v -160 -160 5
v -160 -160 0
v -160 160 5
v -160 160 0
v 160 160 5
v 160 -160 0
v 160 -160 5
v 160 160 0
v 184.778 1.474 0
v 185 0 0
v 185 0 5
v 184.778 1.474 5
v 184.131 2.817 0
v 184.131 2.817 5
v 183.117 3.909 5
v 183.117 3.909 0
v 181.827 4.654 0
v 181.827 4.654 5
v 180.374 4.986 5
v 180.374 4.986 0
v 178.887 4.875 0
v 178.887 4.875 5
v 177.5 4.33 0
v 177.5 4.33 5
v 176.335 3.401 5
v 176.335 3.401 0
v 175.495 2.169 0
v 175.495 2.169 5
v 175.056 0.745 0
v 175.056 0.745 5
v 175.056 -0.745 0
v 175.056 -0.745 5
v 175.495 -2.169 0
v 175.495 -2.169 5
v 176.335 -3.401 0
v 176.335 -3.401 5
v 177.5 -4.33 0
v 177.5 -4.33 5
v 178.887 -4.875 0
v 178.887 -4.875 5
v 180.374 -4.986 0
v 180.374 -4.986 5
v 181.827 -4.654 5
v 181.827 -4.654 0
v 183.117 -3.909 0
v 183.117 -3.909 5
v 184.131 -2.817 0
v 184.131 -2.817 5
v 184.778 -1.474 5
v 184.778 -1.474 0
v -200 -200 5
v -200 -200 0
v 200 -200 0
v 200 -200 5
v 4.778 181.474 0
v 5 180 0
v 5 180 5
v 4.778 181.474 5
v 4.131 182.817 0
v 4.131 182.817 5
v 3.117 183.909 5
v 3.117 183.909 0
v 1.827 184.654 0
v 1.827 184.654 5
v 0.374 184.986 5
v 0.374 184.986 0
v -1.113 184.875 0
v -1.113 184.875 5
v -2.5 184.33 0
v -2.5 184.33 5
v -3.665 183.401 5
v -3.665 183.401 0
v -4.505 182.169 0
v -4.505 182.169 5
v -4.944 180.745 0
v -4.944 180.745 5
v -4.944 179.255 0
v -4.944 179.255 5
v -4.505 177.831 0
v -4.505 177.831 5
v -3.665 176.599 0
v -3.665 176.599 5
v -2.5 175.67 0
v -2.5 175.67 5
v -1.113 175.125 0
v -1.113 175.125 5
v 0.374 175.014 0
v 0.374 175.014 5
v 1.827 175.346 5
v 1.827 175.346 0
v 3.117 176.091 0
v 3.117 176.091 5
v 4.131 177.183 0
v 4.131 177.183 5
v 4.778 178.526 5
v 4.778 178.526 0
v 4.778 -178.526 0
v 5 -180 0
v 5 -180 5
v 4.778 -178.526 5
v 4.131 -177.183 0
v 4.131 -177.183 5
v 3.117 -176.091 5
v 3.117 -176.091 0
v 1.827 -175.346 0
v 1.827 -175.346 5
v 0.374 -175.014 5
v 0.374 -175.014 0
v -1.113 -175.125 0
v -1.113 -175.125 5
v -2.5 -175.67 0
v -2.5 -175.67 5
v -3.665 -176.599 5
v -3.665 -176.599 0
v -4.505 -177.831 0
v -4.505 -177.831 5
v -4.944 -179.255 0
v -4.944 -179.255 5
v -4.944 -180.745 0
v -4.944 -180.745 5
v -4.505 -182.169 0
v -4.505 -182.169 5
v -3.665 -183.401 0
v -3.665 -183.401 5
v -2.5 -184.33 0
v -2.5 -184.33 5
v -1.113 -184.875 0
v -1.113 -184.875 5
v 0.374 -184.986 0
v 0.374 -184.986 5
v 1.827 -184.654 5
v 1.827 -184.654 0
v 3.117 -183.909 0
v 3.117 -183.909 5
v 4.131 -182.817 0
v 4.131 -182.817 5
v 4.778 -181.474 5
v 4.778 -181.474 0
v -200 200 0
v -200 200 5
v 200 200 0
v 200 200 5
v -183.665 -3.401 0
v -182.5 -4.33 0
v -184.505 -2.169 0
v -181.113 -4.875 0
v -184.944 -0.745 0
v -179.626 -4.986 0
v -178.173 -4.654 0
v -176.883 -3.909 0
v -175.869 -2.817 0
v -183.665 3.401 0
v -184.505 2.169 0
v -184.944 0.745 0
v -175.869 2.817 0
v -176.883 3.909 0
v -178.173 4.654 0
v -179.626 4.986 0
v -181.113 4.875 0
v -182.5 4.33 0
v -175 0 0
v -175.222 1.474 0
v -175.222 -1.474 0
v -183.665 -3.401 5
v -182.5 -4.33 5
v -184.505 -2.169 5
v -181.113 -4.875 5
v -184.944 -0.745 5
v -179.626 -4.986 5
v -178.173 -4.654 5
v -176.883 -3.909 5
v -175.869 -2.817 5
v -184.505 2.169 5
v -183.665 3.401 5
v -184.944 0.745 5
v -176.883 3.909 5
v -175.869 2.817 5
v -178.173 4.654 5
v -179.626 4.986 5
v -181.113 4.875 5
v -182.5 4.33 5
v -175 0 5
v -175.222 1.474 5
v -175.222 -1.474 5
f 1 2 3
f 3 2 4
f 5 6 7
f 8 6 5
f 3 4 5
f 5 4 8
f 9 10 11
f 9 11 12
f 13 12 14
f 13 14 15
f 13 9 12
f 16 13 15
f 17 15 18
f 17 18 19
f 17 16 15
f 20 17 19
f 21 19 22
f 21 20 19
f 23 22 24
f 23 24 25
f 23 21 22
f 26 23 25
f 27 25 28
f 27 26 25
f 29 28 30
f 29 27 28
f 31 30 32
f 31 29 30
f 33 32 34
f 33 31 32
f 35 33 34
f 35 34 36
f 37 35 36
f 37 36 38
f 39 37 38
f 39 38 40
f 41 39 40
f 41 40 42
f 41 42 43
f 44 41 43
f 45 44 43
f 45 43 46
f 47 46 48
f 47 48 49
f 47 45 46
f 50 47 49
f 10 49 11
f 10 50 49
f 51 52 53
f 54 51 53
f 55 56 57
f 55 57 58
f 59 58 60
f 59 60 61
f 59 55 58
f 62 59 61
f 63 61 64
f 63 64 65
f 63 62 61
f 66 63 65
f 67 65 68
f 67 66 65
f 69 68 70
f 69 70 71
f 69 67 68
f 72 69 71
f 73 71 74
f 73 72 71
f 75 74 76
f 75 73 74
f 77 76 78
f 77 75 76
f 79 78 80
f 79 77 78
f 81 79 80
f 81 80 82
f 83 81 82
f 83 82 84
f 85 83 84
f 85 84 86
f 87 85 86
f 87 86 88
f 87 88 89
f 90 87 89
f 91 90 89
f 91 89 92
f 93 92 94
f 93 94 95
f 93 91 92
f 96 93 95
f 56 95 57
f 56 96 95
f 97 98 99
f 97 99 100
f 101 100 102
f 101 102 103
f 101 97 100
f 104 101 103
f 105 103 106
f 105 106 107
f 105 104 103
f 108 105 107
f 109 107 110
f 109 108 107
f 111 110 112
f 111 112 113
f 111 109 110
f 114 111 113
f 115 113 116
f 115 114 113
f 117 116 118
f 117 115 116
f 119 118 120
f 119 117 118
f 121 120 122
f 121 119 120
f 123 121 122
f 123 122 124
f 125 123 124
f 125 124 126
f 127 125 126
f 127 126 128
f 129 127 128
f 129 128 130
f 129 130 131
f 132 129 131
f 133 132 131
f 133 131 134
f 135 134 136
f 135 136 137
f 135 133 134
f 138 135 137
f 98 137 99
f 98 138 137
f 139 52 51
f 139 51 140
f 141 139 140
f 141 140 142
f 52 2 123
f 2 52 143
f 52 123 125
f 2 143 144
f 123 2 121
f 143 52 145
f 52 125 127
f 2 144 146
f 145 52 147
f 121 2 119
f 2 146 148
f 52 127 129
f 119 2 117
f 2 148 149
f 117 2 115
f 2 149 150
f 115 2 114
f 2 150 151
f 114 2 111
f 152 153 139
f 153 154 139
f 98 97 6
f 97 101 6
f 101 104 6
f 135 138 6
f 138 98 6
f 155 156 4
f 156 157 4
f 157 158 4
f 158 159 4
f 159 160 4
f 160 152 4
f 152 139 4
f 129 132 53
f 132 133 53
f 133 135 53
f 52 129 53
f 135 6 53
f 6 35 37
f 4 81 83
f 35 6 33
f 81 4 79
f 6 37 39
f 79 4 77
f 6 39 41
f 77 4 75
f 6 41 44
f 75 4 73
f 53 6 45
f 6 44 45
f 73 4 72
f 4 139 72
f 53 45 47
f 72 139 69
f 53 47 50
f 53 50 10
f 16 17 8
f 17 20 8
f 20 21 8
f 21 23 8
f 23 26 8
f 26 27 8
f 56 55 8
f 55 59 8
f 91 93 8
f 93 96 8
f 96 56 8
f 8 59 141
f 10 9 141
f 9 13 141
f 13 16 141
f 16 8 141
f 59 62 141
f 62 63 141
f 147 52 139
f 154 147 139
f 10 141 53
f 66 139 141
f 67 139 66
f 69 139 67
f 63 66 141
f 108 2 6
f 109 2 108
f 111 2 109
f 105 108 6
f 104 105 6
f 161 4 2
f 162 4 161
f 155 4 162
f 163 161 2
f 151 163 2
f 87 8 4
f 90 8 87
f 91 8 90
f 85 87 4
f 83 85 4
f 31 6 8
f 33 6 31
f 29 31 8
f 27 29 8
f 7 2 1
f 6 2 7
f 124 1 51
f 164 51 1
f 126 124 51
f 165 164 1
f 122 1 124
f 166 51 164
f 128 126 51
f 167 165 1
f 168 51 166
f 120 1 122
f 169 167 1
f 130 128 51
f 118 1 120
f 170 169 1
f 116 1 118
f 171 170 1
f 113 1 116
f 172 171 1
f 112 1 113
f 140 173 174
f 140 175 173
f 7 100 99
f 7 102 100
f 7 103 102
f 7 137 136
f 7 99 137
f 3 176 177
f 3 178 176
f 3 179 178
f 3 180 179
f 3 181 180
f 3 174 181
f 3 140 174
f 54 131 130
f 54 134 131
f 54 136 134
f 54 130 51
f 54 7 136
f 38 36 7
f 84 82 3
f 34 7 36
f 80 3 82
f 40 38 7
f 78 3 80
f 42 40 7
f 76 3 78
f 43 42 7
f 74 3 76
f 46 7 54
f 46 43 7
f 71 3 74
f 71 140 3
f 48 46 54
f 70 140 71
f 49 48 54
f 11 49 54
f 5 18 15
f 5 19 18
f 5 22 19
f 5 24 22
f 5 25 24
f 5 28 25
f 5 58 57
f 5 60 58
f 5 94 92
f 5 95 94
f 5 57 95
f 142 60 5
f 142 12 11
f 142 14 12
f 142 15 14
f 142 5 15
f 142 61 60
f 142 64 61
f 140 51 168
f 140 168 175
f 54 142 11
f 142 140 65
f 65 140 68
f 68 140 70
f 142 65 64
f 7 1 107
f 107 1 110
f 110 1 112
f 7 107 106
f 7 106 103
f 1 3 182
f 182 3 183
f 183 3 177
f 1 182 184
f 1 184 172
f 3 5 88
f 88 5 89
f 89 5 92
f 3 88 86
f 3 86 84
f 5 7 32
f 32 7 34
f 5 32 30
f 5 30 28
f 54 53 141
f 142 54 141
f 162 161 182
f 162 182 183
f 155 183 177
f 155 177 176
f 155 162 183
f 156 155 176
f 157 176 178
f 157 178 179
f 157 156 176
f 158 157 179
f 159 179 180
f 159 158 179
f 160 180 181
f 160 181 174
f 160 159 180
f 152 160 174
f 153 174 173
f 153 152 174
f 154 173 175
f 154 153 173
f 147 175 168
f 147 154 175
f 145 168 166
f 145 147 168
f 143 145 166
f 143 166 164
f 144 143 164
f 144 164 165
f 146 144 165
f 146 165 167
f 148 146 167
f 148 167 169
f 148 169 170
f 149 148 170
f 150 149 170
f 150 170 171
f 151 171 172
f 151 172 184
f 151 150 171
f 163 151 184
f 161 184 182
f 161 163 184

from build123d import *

# Parameters (mm, degrees)
F0_W     = 400
F0_H     = 400
F0_R     = 5
F0_W_2   = 320
F0_H_2   = 320
F1_DEPTH = 5


with BuildPart() as f1:
    # F0 (on Top) → F1 (new body)
    with BuildSketch(Plane.XY):
        Rectangle(F0_W, F0_H)
        with Locations((0, -180)):
            Circle(F0_R, mode=Mode.SUBTRACT)
        with Locations((-180, 0)):
            Circle(F0_R, mode=Mode.SUBTRACT)
        Rectangle(F0_W_2, F0_H_2, mode=Mode.SUBTRACT)
        with Locations((180, 0)):
            Circle(F0_R, mode=Mode.SUBTRACT)
        with Locations((0, 180)):
            Circle(F0_R, mode=Mode.SUBTRACT)
    extrude(amount=F1_DEPTH)


solid = f1.part
